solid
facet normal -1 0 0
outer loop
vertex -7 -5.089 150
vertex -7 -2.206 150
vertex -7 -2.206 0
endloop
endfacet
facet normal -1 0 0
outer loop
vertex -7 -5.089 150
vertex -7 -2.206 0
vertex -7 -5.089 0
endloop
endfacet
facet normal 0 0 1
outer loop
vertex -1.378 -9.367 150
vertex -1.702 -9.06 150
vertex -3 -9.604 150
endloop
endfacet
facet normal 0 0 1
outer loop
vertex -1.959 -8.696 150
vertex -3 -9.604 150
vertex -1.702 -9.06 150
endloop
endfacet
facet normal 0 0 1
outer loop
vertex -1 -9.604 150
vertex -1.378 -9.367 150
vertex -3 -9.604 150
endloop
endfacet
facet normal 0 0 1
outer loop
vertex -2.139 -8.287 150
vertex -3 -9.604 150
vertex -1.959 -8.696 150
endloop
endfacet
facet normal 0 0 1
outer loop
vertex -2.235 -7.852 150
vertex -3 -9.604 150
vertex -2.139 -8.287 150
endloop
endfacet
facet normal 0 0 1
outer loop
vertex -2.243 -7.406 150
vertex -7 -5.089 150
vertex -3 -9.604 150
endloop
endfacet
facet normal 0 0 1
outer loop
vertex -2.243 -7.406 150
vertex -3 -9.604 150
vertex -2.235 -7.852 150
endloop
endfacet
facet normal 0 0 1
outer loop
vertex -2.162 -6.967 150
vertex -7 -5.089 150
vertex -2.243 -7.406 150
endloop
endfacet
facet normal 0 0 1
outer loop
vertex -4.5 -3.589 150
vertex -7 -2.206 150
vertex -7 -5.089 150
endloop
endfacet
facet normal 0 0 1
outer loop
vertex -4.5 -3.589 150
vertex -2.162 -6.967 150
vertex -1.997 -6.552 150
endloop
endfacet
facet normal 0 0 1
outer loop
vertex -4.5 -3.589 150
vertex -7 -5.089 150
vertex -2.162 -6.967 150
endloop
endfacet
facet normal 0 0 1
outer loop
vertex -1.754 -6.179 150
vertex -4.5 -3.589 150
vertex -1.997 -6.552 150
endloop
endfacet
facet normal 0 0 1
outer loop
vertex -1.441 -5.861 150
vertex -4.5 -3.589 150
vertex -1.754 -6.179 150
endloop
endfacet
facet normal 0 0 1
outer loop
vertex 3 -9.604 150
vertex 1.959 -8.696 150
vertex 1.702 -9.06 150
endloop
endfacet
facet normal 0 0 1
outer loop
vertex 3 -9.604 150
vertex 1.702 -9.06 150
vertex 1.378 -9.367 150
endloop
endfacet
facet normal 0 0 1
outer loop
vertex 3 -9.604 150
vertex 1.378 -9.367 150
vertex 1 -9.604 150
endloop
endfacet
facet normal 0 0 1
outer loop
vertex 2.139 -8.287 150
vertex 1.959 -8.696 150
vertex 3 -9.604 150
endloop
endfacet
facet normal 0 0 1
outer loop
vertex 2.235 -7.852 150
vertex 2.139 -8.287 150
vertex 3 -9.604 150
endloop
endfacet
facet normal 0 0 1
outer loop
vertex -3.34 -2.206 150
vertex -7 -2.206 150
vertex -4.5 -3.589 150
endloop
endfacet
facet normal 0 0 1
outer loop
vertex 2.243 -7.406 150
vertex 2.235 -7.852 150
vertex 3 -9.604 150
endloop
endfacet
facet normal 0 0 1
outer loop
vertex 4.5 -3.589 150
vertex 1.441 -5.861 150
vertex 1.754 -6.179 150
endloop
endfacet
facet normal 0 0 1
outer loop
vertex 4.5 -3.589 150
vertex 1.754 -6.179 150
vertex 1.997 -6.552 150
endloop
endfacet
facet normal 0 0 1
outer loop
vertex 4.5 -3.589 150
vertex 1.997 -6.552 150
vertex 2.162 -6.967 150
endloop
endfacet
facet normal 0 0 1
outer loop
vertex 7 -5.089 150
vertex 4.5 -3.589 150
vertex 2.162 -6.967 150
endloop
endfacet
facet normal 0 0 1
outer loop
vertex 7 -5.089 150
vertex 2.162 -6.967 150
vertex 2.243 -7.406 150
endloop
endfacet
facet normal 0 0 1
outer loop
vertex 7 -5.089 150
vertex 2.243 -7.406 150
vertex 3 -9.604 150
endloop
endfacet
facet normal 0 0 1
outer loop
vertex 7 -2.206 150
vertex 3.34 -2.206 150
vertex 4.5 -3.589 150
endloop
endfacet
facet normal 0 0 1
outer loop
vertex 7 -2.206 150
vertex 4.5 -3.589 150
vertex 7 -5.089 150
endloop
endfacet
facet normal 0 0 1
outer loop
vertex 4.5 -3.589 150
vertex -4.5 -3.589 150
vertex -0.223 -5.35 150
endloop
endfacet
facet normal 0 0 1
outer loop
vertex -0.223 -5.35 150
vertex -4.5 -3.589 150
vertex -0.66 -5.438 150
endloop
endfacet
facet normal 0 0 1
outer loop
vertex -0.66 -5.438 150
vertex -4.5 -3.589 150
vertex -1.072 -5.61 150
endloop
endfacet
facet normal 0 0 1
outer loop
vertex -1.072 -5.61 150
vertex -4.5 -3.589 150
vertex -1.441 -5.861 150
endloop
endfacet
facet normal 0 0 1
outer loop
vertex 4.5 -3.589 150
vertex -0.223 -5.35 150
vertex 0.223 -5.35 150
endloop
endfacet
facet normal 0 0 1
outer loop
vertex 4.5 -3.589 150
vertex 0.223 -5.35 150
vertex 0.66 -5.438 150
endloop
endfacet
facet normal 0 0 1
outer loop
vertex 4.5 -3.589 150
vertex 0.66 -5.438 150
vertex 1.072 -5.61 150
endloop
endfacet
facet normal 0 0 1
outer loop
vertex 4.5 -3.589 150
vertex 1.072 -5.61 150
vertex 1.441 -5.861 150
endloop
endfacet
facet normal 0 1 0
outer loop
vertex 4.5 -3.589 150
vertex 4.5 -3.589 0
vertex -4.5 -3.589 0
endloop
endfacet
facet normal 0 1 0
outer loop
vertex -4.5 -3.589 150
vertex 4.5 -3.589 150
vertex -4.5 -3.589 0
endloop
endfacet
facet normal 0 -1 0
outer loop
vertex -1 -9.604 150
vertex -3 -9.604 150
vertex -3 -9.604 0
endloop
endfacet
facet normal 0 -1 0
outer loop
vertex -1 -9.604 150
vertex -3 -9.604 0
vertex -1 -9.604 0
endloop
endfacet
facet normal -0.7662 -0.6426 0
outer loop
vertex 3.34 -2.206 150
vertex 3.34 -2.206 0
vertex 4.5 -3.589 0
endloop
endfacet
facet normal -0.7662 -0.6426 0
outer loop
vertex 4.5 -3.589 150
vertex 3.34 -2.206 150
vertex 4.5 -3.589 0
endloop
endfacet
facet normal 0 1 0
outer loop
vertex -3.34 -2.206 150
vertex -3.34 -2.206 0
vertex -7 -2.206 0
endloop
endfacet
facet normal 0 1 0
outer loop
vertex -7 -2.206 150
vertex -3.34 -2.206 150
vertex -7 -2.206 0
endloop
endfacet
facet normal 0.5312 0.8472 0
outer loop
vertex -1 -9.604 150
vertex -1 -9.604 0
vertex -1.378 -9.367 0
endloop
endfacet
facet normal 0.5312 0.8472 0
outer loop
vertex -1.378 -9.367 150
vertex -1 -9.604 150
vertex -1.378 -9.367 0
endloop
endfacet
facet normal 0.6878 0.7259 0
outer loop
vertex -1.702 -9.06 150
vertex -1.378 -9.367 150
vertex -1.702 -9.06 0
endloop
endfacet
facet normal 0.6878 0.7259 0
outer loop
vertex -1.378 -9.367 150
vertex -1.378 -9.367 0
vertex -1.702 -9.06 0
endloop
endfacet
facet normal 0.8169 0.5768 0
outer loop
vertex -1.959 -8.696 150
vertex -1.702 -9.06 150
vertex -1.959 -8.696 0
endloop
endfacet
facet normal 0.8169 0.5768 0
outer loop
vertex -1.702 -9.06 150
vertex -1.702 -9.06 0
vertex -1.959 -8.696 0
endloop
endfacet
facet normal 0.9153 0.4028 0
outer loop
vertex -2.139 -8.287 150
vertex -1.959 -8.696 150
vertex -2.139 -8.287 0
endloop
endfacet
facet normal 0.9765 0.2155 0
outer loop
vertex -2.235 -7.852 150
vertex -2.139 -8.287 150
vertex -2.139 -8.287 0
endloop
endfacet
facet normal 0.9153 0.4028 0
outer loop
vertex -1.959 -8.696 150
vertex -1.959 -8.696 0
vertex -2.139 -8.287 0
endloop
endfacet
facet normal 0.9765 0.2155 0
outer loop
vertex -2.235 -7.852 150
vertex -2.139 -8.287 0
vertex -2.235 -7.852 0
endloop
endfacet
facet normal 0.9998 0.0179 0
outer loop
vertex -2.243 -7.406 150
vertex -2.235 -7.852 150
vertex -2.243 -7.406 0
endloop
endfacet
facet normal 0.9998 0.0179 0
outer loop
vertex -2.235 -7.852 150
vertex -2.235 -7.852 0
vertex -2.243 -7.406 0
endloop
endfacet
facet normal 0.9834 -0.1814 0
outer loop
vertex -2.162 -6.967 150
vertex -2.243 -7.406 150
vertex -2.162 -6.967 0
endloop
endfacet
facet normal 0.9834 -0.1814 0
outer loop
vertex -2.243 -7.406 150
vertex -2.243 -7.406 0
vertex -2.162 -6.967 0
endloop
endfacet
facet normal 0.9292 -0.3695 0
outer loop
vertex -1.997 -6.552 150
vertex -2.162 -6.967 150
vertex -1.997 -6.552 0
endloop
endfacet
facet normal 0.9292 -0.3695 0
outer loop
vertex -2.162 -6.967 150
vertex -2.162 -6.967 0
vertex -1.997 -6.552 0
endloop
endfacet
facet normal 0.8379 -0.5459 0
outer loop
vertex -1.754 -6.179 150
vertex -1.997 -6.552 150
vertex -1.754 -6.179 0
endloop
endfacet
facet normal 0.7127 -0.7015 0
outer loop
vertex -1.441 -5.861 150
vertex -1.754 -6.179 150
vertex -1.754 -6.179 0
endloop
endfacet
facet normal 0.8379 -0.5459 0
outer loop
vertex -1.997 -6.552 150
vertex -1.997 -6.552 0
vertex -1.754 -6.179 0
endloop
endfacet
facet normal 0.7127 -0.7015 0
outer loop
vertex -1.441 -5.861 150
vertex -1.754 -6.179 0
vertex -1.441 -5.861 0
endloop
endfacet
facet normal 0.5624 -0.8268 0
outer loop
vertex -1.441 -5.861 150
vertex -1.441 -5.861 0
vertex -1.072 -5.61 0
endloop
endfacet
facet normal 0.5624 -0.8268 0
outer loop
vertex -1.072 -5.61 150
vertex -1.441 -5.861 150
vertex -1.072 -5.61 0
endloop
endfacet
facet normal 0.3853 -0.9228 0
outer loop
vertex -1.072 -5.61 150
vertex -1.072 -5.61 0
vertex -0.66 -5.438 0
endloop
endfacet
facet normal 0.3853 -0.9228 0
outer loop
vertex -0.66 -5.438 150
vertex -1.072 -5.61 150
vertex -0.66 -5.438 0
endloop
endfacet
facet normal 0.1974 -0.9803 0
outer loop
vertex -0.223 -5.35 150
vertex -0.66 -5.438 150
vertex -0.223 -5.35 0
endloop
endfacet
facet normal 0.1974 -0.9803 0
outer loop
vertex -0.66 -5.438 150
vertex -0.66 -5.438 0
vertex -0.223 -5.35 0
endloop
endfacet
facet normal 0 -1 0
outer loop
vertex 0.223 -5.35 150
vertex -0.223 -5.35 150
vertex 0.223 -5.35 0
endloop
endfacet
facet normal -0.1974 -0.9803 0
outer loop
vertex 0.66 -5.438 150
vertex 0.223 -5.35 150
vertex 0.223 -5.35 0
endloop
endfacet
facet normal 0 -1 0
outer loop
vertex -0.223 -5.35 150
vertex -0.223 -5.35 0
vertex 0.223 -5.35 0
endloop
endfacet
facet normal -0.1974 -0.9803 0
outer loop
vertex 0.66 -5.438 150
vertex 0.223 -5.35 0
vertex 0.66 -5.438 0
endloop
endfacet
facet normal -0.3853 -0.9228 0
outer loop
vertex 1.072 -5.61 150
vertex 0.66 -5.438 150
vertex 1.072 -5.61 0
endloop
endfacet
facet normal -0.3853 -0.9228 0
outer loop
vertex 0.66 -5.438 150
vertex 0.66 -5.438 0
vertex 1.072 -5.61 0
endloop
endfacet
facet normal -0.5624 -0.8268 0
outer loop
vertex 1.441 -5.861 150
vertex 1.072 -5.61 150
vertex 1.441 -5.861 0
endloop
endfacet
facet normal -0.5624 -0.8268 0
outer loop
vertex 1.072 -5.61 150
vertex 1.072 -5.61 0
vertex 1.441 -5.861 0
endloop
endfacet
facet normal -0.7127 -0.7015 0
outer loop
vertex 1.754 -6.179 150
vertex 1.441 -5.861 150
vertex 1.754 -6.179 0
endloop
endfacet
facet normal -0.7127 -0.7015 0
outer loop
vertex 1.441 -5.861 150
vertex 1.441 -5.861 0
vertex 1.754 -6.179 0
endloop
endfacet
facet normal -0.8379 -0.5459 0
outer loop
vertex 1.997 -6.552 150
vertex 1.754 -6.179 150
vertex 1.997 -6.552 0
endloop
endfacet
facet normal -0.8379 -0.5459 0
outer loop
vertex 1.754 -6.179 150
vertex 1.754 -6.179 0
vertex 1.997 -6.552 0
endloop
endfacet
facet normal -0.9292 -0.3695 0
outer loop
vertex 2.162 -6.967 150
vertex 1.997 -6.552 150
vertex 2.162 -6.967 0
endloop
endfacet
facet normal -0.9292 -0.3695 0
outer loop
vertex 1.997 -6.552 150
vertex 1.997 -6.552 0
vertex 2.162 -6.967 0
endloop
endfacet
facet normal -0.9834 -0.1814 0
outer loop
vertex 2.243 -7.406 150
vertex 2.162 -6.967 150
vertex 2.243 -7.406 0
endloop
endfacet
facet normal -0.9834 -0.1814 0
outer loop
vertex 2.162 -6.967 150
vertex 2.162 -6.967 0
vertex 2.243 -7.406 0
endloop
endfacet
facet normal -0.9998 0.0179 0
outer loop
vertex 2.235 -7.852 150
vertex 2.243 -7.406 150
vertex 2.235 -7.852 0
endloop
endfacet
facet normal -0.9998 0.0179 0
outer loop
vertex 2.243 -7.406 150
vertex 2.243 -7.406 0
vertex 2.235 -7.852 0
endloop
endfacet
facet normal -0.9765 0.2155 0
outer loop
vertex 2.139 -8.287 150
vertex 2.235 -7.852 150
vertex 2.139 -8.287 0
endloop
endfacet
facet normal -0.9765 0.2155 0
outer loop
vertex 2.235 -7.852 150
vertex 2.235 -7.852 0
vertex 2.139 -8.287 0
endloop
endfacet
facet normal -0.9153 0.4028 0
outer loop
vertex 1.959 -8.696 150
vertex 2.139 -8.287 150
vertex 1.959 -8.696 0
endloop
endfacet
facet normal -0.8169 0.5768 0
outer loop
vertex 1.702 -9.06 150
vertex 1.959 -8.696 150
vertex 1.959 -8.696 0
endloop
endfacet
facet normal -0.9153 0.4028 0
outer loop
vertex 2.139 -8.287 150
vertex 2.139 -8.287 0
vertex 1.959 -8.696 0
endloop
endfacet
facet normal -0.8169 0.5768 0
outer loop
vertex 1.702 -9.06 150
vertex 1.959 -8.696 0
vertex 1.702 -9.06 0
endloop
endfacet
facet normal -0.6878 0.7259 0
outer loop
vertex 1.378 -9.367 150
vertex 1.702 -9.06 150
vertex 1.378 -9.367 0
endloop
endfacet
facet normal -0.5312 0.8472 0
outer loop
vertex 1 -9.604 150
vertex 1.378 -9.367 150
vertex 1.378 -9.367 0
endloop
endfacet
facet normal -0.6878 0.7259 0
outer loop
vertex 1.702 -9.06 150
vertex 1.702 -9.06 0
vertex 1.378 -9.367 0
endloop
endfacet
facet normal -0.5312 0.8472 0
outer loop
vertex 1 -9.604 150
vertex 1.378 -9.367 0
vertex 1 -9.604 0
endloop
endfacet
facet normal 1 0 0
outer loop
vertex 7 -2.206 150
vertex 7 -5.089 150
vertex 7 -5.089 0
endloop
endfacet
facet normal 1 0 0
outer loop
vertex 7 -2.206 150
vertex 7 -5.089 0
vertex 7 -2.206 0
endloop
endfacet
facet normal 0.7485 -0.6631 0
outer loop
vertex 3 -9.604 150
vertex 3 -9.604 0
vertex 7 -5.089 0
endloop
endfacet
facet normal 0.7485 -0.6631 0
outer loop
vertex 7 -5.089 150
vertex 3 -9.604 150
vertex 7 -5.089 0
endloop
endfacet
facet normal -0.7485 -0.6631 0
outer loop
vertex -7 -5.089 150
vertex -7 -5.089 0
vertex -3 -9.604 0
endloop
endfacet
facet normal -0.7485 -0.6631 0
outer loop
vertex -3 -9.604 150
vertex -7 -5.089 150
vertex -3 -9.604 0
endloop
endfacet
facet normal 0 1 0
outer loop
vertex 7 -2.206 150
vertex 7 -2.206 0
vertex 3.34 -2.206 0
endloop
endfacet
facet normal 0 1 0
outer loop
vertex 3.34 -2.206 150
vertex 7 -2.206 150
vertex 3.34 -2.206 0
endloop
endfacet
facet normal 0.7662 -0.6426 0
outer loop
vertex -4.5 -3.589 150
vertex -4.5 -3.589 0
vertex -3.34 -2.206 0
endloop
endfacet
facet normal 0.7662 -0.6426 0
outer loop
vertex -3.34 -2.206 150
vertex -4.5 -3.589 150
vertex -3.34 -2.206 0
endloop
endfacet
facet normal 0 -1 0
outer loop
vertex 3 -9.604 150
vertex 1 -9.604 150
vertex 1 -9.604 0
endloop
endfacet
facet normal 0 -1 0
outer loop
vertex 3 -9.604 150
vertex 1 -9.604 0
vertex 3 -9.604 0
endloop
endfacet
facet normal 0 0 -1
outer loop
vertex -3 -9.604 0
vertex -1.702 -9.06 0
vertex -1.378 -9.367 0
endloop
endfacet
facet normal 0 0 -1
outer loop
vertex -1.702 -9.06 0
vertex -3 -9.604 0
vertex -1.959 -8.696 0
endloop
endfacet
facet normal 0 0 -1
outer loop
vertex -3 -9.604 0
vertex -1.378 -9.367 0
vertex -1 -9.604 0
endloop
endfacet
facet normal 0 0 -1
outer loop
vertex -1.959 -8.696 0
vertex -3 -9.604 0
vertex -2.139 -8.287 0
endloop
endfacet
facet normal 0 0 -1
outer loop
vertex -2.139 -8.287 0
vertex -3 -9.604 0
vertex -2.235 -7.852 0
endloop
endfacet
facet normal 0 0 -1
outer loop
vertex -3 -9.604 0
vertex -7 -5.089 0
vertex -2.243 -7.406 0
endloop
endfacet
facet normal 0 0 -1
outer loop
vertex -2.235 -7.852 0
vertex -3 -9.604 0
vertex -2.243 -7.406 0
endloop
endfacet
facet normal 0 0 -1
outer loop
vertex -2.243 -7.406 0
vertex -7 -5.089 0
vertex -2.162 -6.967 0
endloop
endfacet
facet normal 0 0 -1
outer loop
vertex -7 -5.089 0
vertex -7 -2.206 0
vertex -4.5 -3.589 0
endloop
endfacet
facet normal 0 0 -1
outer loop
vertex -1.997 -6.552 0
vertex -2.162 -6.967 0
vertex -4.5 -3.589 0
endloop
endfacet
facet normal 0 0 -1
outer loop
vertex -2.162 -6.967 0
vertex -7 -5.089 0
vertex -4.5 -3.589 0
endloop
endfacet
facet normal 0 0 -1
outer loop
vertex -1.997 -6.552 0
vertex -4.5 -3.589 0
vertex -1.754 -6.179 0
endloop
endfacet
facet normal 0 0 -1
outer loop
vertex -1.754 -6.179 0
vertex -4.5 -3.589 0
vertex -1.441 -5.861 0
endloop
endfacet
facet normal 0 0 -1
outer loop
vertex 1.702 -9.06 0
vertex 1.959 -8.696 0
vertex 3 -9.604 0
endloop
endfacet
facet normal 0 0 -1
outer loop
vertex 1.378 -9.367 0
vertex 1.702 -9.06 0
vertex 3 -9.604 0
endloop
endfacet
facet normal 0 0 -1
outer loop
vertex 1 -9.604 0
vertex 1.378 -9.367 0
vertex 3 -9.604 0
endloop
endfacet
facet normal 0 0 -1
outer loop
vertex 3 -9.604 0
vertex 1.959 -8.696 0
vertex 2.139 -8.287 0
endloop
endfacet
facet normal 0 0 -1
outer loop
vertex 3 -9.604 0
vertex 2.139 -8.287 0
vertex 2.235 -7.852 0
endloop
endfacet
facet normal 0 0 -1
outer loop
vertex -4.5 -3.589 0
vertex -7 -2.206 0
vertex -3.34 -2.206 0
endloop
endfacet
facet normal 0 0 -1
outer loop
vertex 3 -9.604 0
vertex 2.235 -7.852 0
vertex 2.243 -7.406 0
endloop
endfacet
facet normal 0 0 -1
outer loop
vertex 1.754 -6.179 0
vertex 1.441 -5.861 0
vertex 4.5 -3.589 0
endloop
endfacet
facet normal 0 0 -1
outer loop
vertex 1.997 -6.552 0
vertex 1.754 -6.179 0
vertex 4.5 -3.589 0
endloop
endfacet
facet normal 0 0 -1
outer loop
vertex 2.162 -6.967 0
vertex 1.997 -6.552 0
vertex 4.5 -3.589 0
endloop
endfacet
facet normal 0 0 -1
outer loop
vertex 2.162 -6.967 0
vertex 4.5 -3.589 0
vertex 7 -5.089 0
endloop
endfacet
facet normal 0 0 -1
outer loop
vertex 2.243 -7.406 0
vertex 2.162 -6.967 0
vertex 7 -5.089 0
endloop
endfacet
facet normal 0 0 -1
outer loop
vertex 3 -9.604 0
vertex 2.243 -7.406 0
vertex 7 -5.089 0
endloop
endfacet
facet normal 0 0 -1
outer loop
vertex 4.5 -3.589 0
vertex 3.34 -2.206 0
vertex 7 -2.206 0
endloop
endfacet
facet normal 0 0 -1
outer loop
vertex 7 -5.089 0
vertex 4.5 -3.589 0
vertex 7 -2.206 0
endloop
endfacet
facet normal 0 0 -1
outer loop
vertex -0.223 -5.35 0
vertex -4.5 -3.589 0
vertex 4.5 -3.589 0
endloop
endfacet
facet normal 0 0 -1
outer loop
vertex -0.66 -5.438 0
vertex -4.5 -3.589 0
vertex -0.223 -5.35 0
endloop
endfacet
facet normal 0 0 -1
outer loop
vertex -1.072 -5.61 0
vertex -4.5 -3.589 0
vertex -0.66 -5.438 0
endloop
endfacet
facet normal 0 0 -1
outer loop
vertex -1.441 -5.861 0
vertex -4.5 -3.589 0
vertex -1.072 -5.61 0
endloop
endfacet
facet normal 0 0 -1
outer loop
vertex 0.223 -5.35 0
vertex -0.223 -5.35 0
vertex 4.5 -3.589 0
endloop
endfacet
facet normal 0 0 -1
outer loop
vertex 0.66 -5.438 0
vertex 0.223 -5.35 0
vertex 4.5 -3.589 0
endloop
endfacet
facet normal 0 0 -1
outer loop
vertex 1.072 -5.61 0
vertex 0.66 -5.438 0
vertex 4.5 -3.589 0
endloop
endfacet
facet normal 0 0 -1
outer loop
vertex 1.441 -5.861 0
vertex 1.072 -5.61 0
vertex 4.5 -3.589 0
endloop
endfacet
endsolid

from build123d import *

# Parameters (mm, degrees)
F1_DEPTH = 150


with BuildPart() as f1:
    # F0 (on Top) → F1 (new body)
    with BuildSketch(Plane.XY):
        Polygon((7, -5.088528), (7, -3.588528), (4.5, -3.588528), (-4.5, -3.588528), (-7, -3.588528), (-7, -5.088528), align=None)
        Polygon((4.5, -3.588528), (7, -3.588528), (7, -2.205549), (3.339543, -2.205549), align=None)
        with BuildLine():
            Line((3, -9.604092), (7, -5.088528))
            Line((7, -5.088528), (-7, -5.088528))
            Line((-7, -5.088528), (-3, -9.604092))
            Line((-3, -9.604092), (-1, -9.604092))
            ThreePointArc((-1, -9.604092), (0, -5.338528), (1, -9.604092))
            Line((1, -9.604092), (3, -9.604092))
        make_face()
        Polygon((-7, -3.588528), (-4.5, -3.588528), (-3.339543, -2.205549), (-7, -2.205549), align=None)
    extrude(amount=F1_DEPTH)


solid = f1.part
